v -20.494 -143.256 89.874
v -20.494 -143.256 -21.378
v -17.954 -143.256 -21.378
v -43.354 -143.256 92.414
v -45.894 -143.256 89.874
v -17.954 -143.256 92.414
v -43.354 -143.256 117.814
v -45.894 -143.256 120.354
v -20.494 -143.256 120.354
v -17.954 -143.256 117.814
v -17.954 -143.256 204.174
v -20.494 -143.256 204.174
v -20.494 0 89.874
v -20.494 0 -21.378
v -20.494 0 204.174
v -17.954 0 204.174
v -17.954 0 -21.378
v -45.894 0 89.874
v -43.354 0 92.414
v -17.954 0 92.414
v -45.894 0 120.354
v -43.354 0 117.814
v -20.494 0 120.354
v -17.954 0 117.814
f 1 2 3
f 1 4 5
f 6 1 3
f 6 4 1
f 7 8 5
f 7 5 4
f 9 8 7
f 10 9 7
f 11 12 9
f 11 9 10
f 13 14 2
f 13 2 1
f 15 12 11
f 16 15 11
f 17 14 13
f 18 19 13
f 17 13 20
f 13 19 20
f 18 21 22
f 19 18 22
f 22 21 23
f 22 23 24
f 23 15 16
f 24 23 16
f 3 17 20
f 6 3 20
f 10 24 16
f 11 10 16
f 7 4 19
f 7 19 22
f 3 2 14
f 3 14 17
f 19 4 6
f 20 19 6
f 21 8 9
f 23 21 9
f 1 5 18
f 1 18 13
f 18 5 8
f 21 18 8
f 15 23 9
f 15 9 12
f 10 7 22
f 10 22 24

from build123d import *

# Parameters (mm, degrees)
F0_W     = 2.54
F0_H     = 225.552
F1_DEPTH = 143.256
F2_W     = 25.4
F2_H     = 30.48
F3_DEPTH = 143.256
F4_W     = 25.4
F4_H     = 25.4
F5_DEPTH = 177.8


with BuildPart() as f1:
    # F0 (on Front) → F1 (new body)
    with BuildSketch(Plane.XZ):
        with Locations((-19.223887, 91.398376)):
            Rectangle(F0_W, F0_H)
    extrude(amount=F1_DEPTH)

    # F2 (on face) → F3 (join)
    with BuildSketch(Plane.XZ.offset(143.256)):
        with Locations((-33.193887, 105.114376)):
            Rectangle(F2_W, F2_H)
    extrude(amount=-F3_DEPTH)

    # F4 (on face) → F5 (cut)
    with BuildSketch(Plane.XZ.offset(143.256)):
        with Locations((-30.653887, 105.114376)):
            Rectangle(F4_W, F4_H)
    extrude(amount=-F5_DEPTH, mode=Mode.SUBTRACT)


solid = f1.part
